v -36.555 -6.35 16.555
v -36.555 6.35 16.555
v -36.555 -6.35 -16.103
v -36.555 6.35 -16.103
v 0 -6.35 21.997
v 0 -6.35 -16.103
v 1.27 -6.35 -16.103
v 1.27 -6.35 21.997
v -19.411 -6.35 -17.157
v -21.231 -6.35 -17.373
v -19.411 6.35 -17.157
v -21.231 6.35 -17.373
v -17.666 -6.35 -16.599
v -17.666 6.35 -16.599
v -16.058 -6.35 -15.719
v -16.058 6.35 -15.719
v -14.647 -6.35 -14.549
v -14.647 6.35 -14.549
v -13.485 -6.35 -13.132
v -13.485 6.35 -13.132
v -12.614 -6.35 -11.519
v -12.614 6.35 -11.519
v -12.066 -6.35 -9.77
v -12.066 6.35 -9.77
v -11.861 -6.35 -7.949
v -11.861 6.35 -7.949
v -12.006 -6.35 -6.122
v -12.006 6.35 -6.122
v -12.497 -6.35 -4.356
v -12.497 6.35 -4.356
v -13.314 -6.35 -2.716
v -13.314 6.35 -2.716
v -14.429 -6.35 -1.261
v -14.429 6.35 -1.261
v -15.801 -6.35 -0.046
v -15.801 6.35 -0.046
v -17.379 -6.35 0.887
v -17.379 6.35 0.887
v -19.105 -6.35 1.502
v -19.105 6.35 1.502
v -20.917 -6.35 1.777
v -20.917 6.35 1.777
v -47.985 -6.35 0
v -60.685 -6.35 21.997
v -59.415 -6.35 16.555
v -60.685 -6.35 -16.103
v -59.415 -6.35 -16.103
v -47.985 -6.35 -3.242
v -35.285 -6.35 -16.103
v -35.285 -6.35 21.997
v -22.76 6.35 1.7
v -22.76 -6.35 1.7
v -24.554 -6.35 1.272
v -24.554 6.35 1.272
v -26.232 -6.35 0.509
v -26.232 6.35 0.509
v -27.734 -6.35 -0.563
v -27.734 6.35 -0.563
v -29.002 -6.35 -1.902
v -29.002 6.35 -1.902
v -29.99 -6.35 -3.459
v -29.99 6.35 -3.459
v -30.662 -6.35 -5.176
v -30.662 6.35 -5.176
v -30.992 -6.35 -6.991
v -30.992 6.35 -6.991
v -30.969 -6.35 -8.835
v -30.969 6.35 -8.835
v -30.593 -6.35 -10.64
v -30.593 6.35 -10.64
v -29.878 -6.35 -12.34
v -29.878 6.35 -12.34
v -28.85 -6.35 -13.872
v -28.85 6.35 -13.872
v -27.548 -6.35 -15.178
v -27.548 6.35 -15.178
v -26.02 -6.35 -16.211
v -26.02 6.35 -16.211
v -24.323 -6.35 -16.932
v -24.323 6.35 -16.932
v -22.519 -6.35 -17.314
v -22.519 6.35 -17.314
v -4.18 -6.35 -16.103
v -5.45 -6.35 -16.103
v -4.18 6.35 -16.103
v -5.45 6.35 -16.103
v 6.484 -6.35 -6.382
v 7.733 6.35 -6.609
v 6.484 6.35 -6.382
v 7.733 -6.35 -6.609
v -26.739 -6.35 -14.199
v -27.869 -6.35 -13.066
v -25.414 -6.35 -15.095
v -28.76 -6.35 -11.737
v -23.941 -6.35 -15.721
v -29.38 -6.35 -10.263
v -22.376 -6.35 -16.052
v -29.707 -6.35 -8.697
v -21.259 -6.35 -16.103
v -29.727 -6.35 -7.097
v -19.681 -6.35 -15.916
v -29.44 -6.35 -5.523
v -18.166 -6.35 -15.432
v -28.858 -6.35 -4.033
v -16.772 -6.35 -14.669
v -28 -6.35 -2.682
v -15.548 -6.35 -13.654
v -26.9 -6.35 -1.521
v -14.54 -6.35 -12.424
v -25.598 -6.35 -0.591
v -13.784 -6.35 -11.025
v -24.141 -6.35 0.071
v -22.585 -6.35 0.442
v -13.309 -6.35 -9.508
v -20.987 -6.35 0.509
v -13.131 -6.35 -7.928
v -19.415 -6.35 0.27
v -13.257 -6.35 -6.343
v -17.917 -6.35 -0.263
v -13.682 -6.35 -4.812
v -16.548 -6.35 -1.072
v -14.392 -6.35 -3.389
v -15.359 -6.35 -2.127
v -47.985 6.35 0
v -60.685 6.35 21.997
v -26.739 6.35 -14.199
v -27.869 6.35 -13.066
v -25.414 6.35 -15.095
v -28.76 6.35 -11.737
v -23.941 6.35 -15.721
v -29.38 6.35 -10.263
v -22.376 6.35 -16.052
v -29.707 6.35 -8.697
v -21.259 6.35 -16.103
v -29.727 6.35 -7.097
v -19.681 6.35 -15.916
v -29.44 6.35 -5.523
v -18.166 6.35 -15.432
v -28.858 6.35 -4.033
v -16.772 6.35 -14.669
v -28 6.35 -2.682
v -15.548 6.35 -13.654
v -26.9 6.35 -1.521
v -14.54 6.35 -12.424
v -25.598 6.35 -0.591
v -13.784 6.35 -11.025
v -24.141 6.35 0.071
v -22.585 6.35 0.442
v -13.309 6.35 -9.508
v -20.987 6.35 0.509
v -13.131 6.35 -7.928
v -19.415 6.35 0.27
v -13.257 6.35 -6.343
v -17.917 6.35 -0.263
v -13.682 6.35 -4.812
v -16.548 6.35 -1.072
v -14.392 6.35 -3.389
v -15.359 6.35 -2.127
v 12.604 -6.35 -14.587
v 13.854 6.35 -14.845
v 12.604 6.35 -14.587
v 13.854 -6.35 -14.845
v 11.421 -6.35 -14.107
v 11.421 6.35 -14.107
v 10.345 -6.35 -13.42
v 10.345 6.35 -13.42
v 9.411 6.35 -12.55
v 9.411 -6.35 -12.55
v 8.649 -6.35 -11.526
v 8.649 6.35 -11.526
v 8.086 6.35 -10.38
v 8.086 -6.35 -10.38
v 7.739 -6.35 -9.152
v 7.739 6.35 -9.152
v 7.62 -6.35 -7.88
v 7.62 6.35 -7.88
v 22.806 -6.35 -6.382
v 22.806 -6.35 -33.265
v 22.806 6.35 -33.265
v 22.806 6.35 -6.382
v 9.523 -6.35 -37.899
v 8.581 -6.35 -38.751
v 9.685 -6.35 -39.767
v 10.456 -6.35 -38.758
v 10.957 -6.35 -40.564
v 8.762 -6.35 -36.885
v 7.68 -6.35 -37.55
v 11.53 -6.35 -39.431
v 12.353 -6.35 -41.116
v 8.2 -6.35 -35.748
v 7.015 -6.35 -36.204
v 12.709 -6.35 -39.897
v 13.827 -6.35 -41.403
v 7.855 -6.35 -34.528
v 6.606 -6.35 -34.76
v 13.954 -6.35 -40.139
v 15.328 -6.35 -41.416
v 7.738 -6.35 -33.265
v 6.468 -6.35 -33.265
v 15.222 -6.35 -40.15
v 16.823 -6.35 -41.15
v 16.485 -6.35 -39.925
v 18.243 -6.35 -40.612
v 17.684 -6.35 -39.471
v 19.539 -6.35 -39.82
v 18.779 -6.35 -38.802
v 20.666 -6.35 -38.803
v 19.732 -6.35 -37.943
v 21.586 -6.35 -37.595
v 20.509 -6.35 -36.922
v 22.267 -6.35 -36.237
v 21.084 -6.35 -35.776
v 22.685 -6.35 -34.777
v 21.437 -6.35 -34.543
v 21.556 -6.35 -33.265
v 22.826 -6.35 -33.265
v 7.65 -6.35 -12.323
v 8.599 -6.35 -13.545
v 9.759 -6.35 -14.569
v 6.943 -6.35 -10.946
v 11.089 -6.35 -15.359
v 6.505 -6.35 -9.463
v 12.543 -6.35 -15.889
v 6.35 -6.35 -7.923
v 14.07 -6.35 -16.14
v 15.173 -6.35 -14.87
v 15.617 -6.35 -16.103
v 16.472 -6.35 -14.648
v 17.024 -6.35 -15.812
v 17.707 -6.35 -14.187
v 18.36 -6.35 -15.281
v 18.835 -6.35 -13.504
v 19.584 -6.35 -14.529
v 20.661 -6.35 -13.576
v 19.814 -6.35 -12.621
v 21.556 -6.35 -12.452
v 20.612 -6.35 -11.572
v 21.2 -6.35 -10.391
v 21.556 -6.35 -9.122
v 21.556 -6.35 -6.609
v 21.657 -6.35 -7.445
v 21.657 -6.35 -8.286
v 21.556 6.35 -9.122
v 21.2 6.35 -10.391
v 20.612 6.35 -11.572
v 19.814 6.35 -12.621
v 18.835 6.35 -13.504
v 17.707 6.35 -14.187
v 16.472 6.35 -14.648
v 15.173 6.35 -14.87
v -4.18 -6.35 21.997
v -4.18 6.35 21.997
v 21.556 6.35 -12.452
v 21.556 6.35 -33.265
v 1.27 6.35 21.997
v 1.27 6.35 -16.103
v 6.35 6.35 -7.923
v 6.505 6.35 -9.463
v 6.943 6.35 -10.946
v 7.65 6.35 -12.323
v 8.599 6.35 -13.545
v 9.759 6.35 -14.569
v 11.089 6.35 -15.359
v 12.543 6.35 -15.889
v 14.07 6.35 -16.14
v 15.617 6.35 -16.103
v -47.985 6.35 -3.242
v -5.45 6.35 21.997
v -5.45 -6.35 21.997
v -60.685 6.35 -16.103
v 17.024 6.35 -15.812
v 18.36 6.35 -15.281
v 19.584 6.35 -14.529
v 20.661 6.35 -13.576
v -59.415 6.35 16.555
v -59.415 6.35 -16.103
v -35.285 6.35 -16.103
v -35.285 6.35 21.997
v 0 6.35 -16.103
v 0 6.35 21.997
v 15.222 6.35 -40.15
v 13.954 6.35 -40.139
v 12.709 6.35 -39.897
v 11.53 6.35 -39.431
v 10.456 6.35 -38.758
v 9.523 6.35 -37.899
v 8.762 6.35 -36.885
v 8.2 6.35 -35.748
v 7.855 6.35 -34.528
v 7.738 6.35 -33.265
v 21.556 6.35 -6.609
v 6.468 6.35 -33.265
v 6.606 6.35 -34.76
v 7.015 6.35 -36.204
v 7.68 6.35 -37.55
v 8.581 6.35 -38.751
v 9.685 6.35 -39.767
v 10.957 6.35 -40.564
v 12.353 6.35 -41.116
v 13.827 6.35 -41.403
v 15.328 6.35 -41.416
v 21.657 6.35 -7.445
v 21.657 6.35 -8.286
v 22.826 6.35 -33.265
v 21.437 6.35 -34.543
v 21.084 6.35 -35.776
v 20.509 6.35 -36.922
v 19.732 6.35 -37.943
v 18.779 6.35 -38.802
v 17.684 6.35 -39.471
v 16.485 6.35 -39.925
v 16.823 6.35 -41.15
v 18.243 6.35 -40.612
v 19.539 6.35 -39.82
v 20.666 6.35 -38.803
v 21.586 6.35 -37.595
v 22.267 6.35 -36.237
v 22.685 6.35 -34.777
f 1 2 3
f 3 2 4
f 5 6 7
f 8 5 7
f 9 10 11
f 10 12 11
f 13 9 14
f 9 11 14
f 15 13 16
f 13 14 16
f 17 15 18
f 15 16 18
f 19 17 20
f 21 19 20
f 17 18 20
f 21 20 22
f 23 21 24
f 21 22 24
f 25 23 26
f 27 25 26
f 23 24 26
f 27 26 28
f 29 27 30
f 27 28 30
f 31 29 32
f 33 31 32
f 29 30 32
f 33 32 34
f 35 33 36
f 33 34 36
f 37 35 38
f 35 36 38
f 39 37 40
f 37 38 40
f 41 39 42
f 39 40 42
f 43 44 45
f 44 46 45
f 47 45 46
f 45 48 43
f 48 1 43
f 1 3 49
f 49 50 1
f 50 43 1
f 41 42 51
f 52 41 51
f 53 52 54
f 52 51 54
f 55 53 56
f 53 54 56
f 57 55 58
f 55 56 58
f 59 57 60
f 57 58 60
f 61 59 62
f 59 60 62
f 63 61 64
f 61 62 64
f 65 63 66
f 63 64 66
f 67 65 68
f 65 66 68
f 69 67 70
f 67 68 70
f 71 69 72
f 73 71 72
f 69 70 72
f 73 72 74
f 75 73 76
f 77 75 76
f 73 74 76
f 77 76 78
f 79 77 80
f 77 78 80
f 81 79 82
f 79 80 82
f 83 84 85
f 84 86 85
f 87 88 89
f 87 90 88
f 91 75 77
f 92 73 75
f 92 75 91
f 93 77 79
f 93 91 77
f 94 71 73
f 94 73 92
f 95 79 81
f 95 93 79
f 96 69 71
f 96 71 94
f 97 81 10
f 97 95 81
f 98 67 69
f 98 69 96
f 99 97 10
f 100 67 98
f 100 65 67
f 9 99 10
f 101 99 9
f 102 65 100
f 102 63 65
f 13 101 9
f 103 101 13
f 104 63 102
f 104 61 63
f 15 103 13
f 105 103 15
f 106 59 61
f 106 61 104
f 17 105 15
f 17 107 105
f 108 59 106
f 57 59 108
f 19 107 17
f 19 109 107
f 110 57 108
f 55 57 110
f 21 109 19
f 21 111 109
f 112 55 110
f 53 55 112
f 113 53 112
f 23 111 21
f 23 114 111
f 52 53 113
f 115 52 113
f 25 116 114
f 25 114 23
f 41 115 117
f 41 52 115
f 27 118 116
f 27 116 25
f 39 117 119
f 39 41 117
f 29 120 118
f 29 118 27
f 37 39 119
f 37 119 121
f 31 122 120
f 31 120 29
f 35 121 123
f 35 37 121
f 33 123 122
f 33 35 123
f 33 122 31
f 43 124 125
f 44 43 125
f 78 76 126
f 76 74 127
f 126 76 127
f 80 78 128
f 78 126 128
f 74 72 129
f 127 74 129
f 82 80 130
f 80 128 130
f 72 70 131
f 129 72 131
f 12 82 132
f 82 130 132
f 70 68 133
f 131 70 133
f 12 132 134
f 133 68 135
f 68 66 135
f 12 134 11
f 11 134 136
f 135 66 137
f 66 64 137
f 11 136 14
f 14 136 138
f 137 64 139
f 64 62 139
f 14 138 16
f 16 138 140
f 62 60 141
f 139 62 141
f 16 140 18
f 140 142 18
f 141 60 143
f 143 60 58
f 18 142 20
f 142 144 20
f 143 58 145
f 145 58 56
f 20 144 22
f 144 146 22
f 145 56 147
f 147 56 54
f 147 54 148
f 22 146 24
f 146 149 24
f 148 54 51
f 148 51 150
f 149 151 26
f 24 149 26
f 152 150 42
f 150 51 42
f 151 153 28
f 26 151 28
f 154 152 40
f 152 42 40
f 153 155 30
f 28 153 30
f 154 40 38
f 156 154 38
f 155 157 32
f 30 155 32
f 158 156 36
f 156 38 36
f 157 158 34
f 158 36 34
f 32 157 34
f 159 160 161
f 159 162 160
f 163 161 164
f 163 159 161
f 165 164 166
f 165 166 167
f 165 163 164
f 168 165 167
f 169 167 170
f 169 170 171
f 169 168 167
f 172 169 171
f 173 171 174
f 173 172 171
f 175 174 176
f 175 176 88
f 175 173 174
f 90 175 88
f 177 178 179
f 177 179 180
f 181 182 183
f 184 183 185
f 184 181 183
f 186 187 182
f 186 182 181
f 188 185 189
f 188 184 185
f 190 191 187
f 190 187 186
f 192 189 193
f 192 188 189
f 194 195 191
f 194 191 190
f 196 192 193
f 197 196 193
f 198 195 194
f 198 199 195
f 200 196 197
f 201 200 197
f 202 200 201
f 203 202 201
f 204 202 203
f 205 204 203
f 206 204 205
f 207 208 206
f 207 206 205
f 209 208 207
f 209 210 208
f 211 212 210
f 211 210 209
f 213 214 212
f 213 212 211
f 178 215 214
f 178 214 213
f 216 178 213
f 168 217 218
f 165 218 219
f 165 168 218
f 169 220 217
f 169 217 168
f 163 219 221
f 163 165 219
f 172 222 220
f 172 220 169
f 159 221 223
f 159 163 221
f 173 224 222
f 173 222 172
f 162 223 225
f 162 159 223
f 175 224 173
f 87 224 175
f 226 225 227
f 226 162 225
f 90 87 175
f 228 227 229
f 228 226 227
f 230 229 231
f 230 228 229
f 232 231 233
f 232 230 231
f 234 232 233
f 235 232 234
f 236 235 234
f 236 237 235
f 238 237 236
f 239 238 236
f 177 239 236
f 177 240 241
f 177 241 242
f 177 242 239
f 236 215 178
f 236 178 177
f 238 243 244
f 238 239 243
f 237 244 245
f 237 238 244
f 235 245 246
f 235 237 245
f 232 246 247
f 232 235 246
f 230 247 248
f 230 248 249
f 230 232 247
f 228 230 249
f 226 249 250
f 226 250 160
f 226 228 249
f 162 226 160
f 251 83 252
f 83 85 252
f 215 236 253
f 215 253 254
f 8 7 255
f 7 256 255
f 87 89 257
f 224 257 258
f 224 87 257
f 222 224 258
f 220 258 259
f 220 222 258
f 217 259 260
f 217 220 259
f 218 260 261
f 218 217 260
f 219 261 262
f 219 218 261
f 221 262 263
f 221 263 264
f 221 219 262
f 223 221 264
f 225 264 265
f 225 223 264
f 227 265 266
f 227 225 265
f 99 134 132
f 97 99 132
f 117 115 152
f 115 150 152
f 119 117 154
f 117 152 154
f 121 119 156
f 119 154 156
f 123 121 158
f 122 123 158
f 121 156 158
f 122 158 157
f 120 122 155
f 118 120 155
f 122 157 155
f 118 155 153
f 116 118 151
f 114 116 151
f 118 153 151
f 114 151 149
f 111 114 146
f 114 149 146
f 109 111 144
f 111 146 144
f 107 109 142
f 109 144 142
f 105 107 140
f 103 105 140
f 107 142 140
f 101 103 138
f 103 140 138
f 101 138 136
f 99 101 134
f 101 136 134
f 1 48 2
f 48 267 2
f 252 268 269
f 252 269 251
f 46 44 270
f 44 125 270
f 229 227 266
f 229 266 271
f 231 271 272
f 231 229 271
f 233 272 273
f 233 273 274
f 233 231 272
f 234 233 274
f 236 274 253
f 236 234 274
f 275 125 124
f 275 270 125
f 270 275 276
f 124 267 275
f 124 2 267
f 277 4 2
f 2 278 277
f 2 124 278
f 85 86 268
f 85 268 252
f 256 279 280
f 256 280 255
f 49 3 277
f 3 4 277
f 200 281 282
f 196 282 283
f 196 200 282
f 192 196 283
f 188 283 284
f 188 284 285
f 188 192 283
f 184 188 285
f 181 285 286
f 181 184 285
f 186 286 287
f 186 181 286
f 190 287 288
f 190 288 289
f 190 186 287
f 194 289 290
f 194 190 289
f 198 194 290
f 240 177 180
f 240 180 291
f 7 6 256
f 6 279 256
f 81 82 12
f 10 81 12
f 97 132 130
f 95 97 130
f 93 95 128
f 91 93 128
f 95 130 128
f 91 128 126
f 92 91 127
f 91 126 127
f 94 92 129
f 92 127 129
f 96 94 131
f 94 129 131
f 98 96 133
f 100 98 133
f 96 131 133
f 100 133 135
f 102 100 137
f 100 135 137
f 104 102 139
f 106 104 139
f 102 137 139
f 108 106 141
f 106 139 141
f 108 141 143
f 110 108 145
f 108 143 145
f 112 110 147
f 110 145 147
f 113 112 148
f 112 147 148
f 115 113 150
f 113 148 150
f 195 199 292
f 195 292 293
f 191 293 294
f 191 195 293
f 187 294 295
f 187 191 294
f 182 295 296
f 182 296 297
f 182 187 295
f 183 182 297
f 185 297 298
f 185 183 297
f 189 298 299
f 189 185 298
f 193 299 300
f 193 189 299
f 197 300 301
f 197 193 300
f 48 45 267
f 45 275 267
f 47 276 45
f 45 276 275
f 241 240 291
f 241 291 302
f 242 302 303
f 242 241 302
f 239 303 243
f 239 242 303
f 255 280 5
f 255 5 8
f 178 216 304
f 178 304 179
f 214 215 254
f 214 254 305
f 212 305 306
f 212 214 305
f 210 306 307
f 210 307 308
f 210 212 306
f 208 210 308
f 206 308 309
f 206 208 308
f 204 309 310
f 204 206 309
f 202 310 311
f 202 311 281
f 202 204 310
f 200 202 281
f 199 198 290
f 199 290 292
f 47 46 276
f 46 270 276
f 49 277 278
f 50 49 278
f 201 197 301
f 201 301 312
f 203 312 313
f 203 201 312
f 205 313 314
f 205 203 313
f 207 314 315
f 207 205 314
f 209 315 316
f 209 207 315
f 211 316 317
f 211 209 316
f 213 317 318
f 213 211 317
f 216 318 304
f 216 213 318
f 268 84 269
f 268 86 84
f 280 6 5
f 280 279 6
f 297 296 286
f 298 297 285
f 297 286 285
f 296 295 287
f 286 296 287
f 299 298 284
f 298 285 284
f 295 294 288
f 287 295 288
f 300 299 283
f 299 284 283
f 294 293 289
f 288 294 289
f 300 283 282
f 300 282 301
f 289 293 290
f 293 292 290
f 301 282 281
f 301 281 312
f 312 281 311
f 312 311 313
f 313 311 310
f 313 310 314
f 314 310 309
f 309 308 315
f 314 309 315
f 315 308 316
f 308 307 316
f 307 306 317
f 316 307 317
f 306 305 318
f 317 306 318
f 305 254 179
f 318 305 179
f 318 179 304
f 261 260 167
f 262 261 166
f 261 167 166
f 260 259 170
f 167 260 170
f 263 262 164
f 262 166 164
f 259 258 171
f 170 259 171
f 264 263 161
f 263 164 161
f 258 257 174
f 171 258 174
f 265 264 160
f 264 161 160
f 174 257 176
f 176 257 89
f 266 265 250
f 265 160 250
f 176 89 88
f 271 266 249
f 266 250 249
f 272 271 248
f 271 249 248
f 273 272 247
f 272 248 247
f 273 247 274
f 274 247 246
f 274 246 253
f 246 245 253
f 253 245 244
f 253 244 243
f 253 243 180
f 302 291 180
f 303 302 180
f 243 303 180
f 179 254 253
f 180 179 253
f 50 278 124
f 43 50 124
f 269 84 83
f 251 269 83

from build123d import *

# Parameters (mm, degrees)
F0_W     = 1.27
F0_H     = 38.1
F1_DEPTH = 6.35


with BuildPart() as f1:
    # F0 (on Front) → F1 (new body, symmetric)
    with BuildSketch(Plane.XZ):
        with BuildLine():
            Line((-22.518771, -17.314378), (-21.231477, -17.372646))
            ThreePointArc((-21.231477, -17.372646), (-11.860949, -7.949196), (-20.917028, 1.776833))
            ThreePointArc((-20.917028, 1.776833), (-30.992348, -6.990651), (-22.518771, -17.314378))
        make_face()
        with BuildLine():
            ThreePointArc((-20.986703, 0.508746), (-13.130778, -7.928344), (-21.259479, -16.102955))
            Line((-21.259479, -16.102955), (-22.376175, -16.052409))
            ThreePointArc((-22.376175, -16.052409), (-29.726794, -7.09683), (-20.986703, 0.508746))
        make_face(mode=Mode.SUBTRACT)
        Polygon((-47.985364, 0), (-60.685364, 21.997045), (-60.685364, -16.102955), (-59.415364, -16.102955), (-59.415364, 16.555277), (-47.985364, -3.242064), (-36.555364, 16.555277), (-36.555364, -16.102955), (-35.285364, -16.102955), (-35.285364, 21.997045), align=None)
        with Locations((-4.815132, 2.947045)):
            Rectangle(F0_W, F0_H)
        with Locations((0.635, 2.947045)):
            Rectangle(F0_W, F0_H)
        with BuildLine():
            ThreePointArc((6.483794, -6.3816), (8.599297, -13.544755), (15.616544, -16.102955))
            ThreePointArc((15.616544, -16.102955), (18.988551, -14.931704), (21.556064, -12.451758))
            Line((21.556064, -12.451758), (21.556064, -9.122014))
            ThreePointArc((21.556064, -9.122014), (18.83474, -13.503633), (13.854417, -14.845492))
            ThreePointArc((13.854417, -14.845492), (9.006453, -12.055452), (7.733309, -6.608785))
            Line((7.733309, -6.608785), (6.483794, -6.3816))
        make_face()
        with BuildLine():
            Line((21.556064, -9.122014), (21.556064, -12.451758))
            ThreePointArc((21.556064, -12.451758), (22.338827, -10.964113), (22.805579, -9.349198))
            Line((22.805579, -9.349198), (22.805579, -6.3816))
            Line((22.805579, -6.3816), (21.556064, -6.608785))
            ThreePointArc((21.556064, -6.608785), (21.669373, -7.865399), (21.556064, -9.122014))
        make_face()
        with BuildLine():
            ThreePointArc((22.805579, -9.349198), (22.338827, -10.964113), (21.556064, -12.451758))
            Line((21.556064, -12.451758), (21.556064, -33.265399))
            Line((21.556064, -33.265399), (22.805579, -33.265399))
            Line((22.805579, -33.265399), (22.805579, -9.349198))
        make_face()
        with BuildLine():
            Line((22.805579, -33.265399), (21.556064, -33.265399))
            ThreePointArc((21.556064, -33.265399), (19.731648, -37.943066), (15.22195, -40.150256))
            Line((15.22195, -40.150256), (15.32759, -41.415855))
            ThreePointArc((15.32759, -41.415855), (20.666277, -38.802931), (22.826064, -33.265399))
            Line((22.826064, -33.265399), (22.805579, -33.265399))
        make_face()
        with BuildLine():
            Line((15.32759, -41.415855), (15.22195, -40.150256))
            ThreePointArc((15.22195, -40.150256), (9.969598, -38.349782), (7.738464, -33.265399))
            Line((7.738464, -33.265399), (6.468464, -33.265399))
            ThreePointArc((6.468464, -33.265399), (9.109732, -39.284411), (15.32759, -41.415855))
        make_face()
    extrude(amount=F1_DEPTH, both=True)


solid = f1.part
